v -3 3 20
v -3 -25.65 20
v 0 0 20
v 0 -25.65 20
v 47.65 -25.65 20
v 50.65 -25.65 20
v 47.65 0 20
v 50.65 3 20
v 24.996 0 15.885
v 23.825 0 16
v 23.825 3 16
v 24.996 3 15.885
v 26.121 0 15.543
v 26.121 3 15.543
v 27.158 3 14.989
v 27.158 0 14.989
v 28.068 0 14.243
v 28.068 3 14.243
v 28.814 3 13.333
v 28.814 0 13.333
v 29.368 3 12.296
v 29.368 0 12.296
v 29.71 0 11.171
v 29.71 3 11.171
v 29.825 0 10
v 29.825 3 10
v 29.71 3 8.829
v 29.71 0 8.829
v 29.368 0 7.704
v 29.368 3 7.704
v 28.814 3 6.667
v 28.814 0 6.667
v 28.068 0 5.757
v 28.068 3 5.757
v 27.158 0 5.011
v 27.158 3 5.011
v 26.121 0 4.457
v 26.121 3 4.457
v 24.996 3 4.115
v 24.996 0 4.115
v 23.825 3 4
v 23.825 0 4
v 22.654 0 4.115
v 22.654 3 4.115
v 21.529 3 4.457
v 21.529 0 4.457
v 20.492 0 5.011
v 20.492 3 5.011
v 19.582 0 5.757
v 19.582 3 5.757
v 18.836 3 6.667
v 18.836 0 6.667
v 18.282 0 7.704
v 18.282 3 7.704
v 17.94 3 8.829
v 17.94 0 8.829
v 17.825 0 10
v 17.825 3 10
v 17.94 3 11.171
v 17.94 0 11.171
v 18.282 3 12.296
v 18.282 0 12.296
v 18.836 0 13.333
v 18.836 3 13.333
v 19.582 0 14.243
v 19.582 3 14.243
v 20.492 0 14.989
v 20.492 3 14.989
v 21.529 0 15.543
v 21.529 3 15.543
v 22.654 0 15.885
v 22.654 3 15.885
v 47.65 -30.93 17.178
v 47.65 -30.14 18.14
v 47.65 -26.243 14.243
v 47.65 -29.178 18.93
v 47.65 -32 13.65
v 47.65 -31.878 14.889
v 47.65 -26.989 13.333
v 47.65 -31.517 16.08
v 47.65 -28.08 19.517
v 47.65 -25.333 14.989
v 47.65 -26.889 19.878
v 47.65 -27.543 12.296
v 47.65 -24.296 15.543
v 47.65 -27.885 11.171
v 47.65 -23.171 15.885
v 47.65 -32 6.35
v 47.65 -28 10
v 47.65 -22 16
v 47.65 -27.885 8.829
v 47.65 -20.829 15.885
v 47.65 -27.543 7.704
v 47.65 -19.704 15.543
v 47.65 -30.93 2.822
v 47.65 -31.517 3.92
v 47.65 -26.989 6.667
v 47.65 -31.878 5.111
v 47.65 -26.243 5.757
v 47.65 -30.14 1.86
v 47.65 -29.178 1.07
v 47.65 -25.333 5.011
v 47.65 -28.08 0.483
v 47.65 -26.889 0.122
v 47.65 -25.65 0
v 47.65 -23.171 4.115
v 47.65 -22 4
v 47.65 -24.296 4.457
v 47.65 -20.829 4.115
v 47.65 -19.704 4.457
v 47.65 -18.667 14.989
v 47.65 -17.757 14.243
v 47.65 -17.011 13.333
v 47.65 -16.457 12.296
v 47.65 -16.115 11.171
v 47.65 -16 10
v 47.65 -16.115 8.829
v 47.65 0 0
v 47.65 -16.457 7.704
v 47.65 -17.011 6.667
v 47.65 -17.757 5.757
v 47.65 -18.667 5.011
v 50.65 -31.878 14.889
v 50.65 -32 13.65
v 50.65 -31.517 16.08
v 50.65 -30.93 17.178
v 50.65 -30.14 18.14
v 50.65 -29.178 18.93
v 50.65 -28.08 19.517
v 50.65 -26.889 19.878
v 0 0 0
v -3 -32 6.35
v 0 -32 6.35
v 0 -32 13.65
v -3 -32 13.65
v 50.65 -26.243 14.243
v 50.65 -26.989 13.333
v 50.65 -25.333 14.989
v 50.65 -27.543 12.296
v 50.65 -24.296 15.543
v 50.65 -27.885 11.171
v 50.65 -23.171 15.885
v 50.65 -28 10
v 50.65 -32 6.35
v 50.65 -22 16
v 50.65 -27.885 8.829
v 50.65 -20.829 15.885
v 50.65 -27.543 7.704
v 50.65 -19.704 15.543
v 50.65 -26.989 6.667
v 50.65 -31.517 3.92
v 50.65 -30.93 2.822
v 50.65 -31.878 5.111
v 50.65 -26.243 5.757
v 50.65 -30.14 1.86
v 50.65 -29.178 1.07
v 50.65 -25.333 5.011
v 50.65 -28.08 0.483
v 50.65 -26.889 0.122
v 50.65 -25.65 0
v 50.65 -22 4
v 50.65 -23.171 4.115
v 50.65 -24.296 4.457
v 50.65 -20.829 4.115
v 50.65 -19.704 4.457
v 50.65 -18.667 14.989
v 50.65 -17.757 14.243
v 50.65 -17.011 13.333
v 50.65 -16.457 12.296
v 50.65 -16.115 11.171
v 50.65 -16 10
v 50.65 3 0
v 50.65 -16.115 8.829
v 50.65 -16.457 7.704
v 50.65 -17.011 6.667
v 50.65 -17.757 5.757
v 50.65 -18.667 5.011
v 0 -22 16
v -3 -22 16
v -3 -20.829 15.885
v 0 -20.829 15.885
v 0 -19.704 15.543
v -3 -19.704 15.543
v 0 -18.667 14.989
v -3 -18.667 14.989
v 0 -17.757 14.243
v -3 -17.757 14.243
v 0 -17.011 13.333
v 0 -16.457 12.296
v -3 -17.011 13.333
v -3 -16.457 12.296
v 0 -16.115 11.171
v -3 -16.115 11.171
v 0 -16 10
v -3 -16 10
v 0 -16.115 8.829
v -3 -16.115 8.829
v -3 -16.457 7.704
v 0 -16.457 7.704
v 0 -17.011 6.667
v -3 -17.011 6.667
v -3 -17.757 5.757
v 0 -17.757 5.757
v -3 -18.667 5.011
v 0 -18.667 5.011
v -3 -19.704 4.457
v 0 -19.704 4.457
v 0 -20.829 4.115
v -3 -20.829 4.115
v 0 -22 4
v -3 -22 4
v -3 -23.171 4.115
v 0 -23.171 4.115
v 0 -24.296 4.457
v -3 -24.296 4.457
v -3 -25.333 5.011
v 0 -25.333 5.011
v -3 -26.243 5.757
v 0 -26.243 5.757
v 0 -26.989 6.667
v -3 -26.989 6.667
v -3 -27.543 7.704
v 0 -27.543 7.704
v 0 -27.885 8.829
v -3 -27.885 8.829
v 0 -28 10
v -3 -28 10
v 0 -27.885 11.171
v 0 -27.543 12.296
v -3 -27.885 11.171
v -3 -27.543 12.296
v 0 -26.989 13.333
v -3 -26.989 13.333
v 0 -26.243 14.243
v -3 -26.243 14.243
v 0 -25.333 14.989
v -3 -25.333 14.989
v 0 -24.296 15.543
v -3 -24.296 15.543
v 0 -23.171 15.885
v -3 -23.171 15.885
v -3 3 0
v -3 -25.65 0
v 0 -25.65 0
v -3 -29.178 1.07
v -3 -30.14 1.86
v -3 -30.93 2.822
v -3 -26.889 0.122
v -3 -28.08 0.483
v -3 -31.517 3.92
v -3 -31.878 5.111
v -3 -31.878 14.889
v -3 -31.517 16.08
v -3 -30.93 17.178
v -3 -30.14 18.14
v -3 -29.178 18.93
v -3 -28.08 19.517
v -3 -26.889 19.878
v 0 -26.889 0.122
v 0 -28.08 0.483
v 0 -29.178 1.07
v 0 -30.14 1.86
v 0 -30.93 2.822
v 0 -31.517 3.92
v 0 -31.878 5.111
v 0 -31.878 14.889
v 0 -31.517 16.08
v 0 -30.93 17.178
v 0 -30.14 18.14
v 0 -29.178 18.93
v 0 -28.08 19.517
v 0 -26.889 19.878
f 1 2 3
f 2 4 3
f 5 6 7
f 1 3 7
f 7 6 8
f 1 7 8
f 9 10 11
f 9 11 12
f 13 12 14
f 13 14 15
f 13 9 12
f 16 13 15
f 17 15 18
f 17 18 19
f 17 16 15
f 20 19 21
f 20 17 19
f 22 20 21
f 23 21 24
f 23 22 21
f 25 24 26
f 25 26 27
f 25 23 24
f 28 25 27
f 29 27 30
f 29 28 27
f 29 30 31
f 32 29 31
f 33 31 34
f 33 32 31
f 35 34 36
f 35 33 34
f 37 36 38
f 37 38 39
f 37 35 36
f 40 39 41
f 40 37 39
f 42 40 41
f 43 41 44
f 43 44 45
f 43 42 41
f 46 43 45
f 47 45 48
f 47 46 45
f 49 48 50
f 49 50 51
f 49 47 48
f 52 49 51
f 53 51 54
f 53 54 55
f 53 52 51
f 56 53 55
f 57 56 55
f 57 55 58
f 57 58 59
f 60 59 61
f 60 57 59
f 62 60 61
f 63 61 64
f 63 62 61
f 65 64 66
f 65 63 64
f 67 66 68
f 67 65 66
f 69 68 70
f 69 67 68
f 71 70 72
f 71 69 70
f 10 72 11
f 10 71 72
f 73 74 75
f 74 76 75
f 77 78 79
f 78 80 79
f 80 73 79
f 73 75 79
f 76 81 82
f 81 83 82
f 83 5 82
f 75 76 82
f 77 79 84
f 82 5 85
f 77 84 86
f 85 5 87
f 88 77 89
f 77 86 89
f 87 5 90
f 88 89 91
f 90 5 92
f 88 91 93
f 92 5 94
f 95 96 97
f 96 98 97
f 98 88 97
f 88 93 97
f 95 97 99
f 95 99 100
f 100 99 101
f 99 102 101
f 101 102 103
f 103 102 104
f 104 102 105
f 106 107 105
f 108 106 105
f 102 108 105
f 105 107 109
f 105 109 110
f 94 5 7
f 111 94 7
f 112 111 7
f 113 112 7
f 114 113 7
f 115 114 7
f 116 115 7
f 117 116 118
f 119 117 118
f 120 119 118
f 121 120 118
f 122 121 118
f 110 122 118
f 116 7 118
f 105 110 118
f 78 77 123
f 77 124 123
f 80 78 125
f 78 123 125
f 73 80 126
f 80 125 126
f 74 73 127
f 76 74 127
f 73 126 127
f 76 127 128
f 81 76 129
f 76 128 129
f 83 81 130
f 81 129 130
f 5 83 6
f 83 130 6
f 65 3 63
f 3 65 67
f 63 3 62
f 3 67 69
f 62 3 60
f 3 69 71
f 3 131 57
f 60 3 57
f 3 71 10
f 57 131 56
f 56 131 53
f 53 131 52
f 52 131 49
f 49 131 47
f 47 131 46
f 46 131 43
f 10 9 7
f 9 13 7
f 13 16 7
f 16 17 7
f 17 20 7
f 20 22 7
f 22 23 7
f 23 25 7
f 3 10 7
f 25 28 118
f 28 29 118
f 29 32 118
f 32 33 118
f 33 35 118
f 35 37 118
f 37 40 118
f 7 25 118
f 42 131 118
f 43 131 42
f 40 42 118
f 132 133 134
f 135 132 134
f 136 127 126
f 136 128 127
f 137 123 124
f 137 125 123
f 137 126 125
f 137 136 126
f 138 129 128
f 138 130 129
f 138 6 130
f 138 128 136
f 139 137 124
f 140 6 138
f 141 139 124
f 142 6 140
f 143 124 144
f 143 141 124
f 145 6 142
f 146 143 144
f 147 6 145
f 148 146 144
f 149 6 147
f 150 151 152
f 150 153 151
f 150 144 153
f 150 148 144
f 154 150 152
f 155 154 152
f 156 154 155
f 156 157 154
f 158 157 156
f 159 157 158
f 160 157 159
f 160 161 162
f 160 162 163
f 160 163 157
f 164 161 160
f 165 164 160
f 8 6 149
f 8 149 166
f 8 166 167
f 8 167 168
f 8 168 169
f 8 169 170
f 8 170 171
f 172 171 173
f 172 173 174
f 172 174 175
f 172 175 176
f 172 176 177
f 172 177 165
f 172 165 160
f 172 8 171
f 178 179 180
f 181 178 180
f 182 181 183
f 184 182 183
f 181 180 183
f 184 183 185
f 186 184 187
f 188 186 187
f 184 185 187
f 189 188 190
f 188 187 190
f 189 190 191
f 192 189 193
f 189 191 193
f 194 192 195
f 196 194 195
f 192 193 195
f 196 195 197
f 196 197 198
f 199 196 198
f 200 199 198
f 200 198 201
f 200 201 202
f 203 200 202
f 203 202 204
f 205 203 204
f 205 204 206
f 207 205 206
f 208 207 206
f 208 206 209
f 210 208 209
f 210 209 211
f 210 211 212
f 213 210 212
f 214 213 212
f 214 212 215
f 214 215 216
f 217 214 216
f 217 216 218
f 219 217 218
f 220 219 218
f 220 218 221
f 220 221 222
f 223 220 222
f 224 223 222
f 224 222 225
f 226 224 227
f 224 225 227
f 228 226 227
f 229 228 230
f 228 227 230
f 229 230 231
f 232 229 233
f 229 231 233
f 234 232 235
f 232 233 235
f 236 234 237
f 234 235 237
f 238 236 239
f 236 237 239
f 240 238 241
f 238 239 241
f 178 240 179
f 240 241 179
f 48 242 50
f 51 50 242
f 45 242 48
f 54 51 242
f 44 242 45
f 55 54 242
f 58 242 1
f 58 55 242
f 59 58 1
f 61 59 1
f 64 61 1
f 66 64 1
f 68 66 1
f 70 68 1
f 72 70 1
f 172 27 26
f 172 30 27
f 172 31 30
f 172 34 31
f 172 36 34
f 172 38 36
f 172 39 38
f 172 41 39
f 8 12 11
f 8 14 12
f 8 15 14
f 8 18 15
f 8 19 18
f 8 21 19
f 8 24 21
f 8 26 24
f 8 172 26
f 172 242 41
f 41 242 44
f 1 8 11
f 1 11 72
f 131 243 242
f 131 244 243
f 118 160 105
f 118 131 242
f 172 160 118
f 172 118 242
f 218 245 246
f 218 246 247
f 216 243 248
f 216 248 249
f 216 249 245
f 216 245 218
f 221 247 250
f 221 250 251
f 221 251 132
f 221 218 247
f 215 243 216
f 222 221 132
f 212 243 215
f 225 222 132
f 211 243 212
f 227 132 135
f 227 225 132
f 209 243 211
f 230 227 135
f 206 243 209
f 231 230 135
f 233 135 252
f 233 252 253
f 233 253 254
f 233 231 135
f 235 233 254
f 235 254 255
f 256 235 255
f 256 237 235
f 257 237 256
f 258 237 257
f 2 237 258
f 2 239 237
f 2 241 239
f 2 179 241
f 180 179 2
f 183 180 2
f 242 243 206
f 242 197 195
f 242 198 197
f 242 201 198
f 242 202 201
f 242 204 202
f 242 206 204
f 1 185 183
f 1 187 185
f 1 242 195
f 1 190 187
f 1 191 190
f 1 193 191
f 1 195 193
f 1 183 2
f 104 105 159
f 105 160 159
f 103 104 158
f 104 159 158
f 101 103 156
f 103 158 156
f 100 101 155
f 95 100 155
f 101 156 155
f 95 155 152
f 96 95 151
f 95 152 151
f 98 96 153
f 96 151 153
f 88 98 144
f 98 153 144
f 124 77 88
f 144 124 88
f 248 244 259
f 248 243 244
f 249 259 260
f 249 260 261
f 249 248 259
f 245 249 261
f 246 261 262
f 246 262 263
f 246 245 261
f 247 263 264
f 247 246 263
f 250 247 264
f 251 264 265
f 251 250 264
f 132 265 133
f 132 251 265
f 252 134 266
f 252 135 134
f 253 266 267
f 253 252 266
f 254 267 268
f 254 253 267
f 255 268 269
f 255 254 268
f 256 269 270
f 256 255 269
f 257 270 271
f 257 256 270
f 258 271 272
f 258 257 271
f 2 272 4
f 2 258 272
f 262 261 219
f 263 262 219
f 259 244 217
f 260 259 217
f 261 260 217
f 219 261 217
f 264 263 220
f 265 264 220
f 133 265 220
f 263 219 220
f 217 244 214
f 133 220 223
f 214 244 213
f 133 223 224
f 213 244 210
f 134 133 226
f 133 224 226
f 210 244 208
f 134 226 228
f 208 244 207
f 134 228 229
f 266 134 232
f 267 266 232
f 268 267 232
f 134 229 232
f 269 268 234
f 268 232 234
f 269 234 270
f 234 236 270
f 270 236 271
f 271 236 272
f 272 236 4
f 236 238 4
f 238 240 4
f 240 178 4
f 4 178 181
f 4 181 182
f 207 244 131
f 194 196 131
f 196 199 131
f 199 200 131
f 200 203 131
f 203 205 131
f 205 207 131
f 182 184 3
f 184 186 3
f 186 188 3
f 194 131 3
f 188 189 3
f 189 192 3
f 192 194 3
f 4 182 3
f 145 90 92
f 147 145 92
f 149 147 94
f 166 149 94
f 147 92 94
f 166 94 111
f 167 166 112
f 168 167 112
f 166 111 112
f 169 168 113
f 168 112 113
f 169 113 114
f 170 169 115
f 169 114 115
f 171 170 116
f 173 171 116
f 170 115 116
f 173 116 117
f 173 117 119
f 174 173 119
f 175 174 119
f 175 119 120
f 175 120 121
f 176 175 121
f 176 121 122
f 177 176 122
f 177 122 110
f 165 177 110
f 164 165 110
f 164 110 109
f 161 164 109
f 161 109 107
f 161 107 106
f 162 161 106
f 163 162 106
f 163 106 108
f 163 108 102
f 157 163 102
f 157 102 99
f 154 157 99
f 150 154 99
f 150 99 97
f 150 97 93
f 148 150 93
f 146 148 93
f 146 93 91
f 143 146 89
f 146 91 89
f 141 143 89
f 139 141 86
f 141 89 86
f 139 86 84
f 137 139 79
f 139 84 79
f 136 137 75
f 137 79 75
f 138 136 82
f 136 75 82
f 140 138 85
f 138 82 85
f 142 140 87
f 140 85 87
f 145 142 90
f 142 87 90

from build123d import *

# Parameters (mm, degrees)
SKETCH2_W           = 47.65
SKETCH2_H           = 20
SKETCH2_R           = 6
BOSS_EXTRUDE1_DEPTH = 3
SKETCH3_W           = 20
SKETCH3_H           = 35
BOSS_EXTRUDE3_DEPTH = 3
SKETCH4_W           = 20
SKETCH4_H           = 35
BOSS_EXTRUDE4_DEPTH = 3
CUT_EXTRUDE1_REACH  = 67.592
SKETCH5_R           = 6
FILLET1_R           = 6.35


with BuildPart() as part:
    # Sketch2 → Boss-Extrude1 (new body)
    with BuildSketch(Plane(origin=(0, 0, 0), x_dir=(1, 0, 0), z_dir=(0, 1, 0))):
        with Locations((23.825, -10)):
            Rectangle(SKETCH2_W, SKETCH2_H)
        with Locations(Location((23.825, -10, 0), (0, 0, 270))):
            Circle(SKETCH2_R, mode=Mode.SUBTRACT)
    extrude(amount=BOSS_EXTRUDE1_DEPTH)

    # Sketch3 → Boss-Extrude3 (add)
    with BuildSketch(Plane(origin=(47.65, 0, 0), x_dir=(0, 0, -1), z_dir=(1, 0, 0))):
        with Locations((-10, -14.5)):
            Rectangle(SKETCH3_W, SKETCH3_H)
    extrude(amount=BOSS_EXTRUDE3_DEPTH)

    # Sketch4 → Boss-Extrude4 (add)
    with BuildSketch(Plane.ZY):
        with Locations((10, -14.5)):
            Rectangle(SKETCH4_W, SKETCH4_H)
    extrude(amount=BOSS_EXTRUDE4_DEPTH)

    # Cut-Extrude1: up to this face of the body (flat: up to its plane)
    cut_extrude1_end = Plane(part.part.faces().sort_by_distance((50.65, -14.5, 10))[0])
    # Sketch5 → Cut-Extrude1 (cut, up to the picked face)
    with BuildSketch(Plane.ZY.offset(3), mode=Mode.PRIVATE) as cut_extrude1_sk1:
        with Locations((10, -22)):
            Circle(SKETCH5_R)
    cut_extrude1_tool1 = split(extrude(cut_extrude1_sk1.sketch, amount=-CUT_EXTRUDE1_REACH, mode=Mode.PRIVATE), bisect_by=cut_extrude1_end, keep=Keep.BOTH, mode=Mode.PRIVATE)
    add(cut_extrude1_tool1.solids().sort_by(Axis((-3, -22, 10), (1, 0, 0)))[0], mode=Mode.SUBTRACT)

    # Fillet1
    fillet1_edges = [part.edges().sort_by_distance(p)[0] for p in [
        (49.15, -32, 20),
        (49.15, -32, 0),
        (-1.5, -32, 0),
        (-1.5, -32, 20),
    ]]
    fillet(fillet1_edges, radius=FILLET1_R)


solid = part.part
